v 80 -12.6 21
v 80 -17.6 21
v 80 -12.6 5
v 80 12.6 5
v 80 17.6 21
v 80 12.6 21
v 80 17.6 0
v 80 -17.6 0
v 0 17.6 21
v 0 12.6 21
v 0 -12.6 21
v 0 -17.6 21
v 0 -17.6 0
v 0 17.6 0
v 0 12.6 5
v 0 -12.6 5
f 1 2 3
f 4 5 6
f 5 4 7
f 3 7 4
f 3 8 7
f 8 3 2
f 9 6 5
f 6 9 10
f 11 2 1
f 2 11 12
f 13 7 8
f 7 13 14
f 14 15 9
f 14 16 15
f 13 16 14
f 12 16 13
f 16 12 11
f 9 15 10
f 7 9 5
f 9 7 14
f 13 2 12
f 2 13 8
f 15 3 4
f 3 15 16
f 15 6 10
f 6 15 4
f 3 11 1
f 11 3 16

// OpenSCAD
module Aggancio(){
    lunghezza_blocco = 80;
    larghezza_tubo = 25.2;
    altezza_tubo = 16;
    spessore_frame = 5;

    difference(){
        translate([0,(-larghezza_tubo - spessore_frame*2)/2,0]){
            cube([lunghezza_blocco,larghezza_tubo + spessore_frame*2 ,altezza_tubo+spessore_frame]);
        }
        translate([0,-larghezza_tubo/2,spessore_frame]){
            cube([lunghezza_blocco,larghezza_tubo,altezza_tubo]);
        }
    }
}

Aggancio();
